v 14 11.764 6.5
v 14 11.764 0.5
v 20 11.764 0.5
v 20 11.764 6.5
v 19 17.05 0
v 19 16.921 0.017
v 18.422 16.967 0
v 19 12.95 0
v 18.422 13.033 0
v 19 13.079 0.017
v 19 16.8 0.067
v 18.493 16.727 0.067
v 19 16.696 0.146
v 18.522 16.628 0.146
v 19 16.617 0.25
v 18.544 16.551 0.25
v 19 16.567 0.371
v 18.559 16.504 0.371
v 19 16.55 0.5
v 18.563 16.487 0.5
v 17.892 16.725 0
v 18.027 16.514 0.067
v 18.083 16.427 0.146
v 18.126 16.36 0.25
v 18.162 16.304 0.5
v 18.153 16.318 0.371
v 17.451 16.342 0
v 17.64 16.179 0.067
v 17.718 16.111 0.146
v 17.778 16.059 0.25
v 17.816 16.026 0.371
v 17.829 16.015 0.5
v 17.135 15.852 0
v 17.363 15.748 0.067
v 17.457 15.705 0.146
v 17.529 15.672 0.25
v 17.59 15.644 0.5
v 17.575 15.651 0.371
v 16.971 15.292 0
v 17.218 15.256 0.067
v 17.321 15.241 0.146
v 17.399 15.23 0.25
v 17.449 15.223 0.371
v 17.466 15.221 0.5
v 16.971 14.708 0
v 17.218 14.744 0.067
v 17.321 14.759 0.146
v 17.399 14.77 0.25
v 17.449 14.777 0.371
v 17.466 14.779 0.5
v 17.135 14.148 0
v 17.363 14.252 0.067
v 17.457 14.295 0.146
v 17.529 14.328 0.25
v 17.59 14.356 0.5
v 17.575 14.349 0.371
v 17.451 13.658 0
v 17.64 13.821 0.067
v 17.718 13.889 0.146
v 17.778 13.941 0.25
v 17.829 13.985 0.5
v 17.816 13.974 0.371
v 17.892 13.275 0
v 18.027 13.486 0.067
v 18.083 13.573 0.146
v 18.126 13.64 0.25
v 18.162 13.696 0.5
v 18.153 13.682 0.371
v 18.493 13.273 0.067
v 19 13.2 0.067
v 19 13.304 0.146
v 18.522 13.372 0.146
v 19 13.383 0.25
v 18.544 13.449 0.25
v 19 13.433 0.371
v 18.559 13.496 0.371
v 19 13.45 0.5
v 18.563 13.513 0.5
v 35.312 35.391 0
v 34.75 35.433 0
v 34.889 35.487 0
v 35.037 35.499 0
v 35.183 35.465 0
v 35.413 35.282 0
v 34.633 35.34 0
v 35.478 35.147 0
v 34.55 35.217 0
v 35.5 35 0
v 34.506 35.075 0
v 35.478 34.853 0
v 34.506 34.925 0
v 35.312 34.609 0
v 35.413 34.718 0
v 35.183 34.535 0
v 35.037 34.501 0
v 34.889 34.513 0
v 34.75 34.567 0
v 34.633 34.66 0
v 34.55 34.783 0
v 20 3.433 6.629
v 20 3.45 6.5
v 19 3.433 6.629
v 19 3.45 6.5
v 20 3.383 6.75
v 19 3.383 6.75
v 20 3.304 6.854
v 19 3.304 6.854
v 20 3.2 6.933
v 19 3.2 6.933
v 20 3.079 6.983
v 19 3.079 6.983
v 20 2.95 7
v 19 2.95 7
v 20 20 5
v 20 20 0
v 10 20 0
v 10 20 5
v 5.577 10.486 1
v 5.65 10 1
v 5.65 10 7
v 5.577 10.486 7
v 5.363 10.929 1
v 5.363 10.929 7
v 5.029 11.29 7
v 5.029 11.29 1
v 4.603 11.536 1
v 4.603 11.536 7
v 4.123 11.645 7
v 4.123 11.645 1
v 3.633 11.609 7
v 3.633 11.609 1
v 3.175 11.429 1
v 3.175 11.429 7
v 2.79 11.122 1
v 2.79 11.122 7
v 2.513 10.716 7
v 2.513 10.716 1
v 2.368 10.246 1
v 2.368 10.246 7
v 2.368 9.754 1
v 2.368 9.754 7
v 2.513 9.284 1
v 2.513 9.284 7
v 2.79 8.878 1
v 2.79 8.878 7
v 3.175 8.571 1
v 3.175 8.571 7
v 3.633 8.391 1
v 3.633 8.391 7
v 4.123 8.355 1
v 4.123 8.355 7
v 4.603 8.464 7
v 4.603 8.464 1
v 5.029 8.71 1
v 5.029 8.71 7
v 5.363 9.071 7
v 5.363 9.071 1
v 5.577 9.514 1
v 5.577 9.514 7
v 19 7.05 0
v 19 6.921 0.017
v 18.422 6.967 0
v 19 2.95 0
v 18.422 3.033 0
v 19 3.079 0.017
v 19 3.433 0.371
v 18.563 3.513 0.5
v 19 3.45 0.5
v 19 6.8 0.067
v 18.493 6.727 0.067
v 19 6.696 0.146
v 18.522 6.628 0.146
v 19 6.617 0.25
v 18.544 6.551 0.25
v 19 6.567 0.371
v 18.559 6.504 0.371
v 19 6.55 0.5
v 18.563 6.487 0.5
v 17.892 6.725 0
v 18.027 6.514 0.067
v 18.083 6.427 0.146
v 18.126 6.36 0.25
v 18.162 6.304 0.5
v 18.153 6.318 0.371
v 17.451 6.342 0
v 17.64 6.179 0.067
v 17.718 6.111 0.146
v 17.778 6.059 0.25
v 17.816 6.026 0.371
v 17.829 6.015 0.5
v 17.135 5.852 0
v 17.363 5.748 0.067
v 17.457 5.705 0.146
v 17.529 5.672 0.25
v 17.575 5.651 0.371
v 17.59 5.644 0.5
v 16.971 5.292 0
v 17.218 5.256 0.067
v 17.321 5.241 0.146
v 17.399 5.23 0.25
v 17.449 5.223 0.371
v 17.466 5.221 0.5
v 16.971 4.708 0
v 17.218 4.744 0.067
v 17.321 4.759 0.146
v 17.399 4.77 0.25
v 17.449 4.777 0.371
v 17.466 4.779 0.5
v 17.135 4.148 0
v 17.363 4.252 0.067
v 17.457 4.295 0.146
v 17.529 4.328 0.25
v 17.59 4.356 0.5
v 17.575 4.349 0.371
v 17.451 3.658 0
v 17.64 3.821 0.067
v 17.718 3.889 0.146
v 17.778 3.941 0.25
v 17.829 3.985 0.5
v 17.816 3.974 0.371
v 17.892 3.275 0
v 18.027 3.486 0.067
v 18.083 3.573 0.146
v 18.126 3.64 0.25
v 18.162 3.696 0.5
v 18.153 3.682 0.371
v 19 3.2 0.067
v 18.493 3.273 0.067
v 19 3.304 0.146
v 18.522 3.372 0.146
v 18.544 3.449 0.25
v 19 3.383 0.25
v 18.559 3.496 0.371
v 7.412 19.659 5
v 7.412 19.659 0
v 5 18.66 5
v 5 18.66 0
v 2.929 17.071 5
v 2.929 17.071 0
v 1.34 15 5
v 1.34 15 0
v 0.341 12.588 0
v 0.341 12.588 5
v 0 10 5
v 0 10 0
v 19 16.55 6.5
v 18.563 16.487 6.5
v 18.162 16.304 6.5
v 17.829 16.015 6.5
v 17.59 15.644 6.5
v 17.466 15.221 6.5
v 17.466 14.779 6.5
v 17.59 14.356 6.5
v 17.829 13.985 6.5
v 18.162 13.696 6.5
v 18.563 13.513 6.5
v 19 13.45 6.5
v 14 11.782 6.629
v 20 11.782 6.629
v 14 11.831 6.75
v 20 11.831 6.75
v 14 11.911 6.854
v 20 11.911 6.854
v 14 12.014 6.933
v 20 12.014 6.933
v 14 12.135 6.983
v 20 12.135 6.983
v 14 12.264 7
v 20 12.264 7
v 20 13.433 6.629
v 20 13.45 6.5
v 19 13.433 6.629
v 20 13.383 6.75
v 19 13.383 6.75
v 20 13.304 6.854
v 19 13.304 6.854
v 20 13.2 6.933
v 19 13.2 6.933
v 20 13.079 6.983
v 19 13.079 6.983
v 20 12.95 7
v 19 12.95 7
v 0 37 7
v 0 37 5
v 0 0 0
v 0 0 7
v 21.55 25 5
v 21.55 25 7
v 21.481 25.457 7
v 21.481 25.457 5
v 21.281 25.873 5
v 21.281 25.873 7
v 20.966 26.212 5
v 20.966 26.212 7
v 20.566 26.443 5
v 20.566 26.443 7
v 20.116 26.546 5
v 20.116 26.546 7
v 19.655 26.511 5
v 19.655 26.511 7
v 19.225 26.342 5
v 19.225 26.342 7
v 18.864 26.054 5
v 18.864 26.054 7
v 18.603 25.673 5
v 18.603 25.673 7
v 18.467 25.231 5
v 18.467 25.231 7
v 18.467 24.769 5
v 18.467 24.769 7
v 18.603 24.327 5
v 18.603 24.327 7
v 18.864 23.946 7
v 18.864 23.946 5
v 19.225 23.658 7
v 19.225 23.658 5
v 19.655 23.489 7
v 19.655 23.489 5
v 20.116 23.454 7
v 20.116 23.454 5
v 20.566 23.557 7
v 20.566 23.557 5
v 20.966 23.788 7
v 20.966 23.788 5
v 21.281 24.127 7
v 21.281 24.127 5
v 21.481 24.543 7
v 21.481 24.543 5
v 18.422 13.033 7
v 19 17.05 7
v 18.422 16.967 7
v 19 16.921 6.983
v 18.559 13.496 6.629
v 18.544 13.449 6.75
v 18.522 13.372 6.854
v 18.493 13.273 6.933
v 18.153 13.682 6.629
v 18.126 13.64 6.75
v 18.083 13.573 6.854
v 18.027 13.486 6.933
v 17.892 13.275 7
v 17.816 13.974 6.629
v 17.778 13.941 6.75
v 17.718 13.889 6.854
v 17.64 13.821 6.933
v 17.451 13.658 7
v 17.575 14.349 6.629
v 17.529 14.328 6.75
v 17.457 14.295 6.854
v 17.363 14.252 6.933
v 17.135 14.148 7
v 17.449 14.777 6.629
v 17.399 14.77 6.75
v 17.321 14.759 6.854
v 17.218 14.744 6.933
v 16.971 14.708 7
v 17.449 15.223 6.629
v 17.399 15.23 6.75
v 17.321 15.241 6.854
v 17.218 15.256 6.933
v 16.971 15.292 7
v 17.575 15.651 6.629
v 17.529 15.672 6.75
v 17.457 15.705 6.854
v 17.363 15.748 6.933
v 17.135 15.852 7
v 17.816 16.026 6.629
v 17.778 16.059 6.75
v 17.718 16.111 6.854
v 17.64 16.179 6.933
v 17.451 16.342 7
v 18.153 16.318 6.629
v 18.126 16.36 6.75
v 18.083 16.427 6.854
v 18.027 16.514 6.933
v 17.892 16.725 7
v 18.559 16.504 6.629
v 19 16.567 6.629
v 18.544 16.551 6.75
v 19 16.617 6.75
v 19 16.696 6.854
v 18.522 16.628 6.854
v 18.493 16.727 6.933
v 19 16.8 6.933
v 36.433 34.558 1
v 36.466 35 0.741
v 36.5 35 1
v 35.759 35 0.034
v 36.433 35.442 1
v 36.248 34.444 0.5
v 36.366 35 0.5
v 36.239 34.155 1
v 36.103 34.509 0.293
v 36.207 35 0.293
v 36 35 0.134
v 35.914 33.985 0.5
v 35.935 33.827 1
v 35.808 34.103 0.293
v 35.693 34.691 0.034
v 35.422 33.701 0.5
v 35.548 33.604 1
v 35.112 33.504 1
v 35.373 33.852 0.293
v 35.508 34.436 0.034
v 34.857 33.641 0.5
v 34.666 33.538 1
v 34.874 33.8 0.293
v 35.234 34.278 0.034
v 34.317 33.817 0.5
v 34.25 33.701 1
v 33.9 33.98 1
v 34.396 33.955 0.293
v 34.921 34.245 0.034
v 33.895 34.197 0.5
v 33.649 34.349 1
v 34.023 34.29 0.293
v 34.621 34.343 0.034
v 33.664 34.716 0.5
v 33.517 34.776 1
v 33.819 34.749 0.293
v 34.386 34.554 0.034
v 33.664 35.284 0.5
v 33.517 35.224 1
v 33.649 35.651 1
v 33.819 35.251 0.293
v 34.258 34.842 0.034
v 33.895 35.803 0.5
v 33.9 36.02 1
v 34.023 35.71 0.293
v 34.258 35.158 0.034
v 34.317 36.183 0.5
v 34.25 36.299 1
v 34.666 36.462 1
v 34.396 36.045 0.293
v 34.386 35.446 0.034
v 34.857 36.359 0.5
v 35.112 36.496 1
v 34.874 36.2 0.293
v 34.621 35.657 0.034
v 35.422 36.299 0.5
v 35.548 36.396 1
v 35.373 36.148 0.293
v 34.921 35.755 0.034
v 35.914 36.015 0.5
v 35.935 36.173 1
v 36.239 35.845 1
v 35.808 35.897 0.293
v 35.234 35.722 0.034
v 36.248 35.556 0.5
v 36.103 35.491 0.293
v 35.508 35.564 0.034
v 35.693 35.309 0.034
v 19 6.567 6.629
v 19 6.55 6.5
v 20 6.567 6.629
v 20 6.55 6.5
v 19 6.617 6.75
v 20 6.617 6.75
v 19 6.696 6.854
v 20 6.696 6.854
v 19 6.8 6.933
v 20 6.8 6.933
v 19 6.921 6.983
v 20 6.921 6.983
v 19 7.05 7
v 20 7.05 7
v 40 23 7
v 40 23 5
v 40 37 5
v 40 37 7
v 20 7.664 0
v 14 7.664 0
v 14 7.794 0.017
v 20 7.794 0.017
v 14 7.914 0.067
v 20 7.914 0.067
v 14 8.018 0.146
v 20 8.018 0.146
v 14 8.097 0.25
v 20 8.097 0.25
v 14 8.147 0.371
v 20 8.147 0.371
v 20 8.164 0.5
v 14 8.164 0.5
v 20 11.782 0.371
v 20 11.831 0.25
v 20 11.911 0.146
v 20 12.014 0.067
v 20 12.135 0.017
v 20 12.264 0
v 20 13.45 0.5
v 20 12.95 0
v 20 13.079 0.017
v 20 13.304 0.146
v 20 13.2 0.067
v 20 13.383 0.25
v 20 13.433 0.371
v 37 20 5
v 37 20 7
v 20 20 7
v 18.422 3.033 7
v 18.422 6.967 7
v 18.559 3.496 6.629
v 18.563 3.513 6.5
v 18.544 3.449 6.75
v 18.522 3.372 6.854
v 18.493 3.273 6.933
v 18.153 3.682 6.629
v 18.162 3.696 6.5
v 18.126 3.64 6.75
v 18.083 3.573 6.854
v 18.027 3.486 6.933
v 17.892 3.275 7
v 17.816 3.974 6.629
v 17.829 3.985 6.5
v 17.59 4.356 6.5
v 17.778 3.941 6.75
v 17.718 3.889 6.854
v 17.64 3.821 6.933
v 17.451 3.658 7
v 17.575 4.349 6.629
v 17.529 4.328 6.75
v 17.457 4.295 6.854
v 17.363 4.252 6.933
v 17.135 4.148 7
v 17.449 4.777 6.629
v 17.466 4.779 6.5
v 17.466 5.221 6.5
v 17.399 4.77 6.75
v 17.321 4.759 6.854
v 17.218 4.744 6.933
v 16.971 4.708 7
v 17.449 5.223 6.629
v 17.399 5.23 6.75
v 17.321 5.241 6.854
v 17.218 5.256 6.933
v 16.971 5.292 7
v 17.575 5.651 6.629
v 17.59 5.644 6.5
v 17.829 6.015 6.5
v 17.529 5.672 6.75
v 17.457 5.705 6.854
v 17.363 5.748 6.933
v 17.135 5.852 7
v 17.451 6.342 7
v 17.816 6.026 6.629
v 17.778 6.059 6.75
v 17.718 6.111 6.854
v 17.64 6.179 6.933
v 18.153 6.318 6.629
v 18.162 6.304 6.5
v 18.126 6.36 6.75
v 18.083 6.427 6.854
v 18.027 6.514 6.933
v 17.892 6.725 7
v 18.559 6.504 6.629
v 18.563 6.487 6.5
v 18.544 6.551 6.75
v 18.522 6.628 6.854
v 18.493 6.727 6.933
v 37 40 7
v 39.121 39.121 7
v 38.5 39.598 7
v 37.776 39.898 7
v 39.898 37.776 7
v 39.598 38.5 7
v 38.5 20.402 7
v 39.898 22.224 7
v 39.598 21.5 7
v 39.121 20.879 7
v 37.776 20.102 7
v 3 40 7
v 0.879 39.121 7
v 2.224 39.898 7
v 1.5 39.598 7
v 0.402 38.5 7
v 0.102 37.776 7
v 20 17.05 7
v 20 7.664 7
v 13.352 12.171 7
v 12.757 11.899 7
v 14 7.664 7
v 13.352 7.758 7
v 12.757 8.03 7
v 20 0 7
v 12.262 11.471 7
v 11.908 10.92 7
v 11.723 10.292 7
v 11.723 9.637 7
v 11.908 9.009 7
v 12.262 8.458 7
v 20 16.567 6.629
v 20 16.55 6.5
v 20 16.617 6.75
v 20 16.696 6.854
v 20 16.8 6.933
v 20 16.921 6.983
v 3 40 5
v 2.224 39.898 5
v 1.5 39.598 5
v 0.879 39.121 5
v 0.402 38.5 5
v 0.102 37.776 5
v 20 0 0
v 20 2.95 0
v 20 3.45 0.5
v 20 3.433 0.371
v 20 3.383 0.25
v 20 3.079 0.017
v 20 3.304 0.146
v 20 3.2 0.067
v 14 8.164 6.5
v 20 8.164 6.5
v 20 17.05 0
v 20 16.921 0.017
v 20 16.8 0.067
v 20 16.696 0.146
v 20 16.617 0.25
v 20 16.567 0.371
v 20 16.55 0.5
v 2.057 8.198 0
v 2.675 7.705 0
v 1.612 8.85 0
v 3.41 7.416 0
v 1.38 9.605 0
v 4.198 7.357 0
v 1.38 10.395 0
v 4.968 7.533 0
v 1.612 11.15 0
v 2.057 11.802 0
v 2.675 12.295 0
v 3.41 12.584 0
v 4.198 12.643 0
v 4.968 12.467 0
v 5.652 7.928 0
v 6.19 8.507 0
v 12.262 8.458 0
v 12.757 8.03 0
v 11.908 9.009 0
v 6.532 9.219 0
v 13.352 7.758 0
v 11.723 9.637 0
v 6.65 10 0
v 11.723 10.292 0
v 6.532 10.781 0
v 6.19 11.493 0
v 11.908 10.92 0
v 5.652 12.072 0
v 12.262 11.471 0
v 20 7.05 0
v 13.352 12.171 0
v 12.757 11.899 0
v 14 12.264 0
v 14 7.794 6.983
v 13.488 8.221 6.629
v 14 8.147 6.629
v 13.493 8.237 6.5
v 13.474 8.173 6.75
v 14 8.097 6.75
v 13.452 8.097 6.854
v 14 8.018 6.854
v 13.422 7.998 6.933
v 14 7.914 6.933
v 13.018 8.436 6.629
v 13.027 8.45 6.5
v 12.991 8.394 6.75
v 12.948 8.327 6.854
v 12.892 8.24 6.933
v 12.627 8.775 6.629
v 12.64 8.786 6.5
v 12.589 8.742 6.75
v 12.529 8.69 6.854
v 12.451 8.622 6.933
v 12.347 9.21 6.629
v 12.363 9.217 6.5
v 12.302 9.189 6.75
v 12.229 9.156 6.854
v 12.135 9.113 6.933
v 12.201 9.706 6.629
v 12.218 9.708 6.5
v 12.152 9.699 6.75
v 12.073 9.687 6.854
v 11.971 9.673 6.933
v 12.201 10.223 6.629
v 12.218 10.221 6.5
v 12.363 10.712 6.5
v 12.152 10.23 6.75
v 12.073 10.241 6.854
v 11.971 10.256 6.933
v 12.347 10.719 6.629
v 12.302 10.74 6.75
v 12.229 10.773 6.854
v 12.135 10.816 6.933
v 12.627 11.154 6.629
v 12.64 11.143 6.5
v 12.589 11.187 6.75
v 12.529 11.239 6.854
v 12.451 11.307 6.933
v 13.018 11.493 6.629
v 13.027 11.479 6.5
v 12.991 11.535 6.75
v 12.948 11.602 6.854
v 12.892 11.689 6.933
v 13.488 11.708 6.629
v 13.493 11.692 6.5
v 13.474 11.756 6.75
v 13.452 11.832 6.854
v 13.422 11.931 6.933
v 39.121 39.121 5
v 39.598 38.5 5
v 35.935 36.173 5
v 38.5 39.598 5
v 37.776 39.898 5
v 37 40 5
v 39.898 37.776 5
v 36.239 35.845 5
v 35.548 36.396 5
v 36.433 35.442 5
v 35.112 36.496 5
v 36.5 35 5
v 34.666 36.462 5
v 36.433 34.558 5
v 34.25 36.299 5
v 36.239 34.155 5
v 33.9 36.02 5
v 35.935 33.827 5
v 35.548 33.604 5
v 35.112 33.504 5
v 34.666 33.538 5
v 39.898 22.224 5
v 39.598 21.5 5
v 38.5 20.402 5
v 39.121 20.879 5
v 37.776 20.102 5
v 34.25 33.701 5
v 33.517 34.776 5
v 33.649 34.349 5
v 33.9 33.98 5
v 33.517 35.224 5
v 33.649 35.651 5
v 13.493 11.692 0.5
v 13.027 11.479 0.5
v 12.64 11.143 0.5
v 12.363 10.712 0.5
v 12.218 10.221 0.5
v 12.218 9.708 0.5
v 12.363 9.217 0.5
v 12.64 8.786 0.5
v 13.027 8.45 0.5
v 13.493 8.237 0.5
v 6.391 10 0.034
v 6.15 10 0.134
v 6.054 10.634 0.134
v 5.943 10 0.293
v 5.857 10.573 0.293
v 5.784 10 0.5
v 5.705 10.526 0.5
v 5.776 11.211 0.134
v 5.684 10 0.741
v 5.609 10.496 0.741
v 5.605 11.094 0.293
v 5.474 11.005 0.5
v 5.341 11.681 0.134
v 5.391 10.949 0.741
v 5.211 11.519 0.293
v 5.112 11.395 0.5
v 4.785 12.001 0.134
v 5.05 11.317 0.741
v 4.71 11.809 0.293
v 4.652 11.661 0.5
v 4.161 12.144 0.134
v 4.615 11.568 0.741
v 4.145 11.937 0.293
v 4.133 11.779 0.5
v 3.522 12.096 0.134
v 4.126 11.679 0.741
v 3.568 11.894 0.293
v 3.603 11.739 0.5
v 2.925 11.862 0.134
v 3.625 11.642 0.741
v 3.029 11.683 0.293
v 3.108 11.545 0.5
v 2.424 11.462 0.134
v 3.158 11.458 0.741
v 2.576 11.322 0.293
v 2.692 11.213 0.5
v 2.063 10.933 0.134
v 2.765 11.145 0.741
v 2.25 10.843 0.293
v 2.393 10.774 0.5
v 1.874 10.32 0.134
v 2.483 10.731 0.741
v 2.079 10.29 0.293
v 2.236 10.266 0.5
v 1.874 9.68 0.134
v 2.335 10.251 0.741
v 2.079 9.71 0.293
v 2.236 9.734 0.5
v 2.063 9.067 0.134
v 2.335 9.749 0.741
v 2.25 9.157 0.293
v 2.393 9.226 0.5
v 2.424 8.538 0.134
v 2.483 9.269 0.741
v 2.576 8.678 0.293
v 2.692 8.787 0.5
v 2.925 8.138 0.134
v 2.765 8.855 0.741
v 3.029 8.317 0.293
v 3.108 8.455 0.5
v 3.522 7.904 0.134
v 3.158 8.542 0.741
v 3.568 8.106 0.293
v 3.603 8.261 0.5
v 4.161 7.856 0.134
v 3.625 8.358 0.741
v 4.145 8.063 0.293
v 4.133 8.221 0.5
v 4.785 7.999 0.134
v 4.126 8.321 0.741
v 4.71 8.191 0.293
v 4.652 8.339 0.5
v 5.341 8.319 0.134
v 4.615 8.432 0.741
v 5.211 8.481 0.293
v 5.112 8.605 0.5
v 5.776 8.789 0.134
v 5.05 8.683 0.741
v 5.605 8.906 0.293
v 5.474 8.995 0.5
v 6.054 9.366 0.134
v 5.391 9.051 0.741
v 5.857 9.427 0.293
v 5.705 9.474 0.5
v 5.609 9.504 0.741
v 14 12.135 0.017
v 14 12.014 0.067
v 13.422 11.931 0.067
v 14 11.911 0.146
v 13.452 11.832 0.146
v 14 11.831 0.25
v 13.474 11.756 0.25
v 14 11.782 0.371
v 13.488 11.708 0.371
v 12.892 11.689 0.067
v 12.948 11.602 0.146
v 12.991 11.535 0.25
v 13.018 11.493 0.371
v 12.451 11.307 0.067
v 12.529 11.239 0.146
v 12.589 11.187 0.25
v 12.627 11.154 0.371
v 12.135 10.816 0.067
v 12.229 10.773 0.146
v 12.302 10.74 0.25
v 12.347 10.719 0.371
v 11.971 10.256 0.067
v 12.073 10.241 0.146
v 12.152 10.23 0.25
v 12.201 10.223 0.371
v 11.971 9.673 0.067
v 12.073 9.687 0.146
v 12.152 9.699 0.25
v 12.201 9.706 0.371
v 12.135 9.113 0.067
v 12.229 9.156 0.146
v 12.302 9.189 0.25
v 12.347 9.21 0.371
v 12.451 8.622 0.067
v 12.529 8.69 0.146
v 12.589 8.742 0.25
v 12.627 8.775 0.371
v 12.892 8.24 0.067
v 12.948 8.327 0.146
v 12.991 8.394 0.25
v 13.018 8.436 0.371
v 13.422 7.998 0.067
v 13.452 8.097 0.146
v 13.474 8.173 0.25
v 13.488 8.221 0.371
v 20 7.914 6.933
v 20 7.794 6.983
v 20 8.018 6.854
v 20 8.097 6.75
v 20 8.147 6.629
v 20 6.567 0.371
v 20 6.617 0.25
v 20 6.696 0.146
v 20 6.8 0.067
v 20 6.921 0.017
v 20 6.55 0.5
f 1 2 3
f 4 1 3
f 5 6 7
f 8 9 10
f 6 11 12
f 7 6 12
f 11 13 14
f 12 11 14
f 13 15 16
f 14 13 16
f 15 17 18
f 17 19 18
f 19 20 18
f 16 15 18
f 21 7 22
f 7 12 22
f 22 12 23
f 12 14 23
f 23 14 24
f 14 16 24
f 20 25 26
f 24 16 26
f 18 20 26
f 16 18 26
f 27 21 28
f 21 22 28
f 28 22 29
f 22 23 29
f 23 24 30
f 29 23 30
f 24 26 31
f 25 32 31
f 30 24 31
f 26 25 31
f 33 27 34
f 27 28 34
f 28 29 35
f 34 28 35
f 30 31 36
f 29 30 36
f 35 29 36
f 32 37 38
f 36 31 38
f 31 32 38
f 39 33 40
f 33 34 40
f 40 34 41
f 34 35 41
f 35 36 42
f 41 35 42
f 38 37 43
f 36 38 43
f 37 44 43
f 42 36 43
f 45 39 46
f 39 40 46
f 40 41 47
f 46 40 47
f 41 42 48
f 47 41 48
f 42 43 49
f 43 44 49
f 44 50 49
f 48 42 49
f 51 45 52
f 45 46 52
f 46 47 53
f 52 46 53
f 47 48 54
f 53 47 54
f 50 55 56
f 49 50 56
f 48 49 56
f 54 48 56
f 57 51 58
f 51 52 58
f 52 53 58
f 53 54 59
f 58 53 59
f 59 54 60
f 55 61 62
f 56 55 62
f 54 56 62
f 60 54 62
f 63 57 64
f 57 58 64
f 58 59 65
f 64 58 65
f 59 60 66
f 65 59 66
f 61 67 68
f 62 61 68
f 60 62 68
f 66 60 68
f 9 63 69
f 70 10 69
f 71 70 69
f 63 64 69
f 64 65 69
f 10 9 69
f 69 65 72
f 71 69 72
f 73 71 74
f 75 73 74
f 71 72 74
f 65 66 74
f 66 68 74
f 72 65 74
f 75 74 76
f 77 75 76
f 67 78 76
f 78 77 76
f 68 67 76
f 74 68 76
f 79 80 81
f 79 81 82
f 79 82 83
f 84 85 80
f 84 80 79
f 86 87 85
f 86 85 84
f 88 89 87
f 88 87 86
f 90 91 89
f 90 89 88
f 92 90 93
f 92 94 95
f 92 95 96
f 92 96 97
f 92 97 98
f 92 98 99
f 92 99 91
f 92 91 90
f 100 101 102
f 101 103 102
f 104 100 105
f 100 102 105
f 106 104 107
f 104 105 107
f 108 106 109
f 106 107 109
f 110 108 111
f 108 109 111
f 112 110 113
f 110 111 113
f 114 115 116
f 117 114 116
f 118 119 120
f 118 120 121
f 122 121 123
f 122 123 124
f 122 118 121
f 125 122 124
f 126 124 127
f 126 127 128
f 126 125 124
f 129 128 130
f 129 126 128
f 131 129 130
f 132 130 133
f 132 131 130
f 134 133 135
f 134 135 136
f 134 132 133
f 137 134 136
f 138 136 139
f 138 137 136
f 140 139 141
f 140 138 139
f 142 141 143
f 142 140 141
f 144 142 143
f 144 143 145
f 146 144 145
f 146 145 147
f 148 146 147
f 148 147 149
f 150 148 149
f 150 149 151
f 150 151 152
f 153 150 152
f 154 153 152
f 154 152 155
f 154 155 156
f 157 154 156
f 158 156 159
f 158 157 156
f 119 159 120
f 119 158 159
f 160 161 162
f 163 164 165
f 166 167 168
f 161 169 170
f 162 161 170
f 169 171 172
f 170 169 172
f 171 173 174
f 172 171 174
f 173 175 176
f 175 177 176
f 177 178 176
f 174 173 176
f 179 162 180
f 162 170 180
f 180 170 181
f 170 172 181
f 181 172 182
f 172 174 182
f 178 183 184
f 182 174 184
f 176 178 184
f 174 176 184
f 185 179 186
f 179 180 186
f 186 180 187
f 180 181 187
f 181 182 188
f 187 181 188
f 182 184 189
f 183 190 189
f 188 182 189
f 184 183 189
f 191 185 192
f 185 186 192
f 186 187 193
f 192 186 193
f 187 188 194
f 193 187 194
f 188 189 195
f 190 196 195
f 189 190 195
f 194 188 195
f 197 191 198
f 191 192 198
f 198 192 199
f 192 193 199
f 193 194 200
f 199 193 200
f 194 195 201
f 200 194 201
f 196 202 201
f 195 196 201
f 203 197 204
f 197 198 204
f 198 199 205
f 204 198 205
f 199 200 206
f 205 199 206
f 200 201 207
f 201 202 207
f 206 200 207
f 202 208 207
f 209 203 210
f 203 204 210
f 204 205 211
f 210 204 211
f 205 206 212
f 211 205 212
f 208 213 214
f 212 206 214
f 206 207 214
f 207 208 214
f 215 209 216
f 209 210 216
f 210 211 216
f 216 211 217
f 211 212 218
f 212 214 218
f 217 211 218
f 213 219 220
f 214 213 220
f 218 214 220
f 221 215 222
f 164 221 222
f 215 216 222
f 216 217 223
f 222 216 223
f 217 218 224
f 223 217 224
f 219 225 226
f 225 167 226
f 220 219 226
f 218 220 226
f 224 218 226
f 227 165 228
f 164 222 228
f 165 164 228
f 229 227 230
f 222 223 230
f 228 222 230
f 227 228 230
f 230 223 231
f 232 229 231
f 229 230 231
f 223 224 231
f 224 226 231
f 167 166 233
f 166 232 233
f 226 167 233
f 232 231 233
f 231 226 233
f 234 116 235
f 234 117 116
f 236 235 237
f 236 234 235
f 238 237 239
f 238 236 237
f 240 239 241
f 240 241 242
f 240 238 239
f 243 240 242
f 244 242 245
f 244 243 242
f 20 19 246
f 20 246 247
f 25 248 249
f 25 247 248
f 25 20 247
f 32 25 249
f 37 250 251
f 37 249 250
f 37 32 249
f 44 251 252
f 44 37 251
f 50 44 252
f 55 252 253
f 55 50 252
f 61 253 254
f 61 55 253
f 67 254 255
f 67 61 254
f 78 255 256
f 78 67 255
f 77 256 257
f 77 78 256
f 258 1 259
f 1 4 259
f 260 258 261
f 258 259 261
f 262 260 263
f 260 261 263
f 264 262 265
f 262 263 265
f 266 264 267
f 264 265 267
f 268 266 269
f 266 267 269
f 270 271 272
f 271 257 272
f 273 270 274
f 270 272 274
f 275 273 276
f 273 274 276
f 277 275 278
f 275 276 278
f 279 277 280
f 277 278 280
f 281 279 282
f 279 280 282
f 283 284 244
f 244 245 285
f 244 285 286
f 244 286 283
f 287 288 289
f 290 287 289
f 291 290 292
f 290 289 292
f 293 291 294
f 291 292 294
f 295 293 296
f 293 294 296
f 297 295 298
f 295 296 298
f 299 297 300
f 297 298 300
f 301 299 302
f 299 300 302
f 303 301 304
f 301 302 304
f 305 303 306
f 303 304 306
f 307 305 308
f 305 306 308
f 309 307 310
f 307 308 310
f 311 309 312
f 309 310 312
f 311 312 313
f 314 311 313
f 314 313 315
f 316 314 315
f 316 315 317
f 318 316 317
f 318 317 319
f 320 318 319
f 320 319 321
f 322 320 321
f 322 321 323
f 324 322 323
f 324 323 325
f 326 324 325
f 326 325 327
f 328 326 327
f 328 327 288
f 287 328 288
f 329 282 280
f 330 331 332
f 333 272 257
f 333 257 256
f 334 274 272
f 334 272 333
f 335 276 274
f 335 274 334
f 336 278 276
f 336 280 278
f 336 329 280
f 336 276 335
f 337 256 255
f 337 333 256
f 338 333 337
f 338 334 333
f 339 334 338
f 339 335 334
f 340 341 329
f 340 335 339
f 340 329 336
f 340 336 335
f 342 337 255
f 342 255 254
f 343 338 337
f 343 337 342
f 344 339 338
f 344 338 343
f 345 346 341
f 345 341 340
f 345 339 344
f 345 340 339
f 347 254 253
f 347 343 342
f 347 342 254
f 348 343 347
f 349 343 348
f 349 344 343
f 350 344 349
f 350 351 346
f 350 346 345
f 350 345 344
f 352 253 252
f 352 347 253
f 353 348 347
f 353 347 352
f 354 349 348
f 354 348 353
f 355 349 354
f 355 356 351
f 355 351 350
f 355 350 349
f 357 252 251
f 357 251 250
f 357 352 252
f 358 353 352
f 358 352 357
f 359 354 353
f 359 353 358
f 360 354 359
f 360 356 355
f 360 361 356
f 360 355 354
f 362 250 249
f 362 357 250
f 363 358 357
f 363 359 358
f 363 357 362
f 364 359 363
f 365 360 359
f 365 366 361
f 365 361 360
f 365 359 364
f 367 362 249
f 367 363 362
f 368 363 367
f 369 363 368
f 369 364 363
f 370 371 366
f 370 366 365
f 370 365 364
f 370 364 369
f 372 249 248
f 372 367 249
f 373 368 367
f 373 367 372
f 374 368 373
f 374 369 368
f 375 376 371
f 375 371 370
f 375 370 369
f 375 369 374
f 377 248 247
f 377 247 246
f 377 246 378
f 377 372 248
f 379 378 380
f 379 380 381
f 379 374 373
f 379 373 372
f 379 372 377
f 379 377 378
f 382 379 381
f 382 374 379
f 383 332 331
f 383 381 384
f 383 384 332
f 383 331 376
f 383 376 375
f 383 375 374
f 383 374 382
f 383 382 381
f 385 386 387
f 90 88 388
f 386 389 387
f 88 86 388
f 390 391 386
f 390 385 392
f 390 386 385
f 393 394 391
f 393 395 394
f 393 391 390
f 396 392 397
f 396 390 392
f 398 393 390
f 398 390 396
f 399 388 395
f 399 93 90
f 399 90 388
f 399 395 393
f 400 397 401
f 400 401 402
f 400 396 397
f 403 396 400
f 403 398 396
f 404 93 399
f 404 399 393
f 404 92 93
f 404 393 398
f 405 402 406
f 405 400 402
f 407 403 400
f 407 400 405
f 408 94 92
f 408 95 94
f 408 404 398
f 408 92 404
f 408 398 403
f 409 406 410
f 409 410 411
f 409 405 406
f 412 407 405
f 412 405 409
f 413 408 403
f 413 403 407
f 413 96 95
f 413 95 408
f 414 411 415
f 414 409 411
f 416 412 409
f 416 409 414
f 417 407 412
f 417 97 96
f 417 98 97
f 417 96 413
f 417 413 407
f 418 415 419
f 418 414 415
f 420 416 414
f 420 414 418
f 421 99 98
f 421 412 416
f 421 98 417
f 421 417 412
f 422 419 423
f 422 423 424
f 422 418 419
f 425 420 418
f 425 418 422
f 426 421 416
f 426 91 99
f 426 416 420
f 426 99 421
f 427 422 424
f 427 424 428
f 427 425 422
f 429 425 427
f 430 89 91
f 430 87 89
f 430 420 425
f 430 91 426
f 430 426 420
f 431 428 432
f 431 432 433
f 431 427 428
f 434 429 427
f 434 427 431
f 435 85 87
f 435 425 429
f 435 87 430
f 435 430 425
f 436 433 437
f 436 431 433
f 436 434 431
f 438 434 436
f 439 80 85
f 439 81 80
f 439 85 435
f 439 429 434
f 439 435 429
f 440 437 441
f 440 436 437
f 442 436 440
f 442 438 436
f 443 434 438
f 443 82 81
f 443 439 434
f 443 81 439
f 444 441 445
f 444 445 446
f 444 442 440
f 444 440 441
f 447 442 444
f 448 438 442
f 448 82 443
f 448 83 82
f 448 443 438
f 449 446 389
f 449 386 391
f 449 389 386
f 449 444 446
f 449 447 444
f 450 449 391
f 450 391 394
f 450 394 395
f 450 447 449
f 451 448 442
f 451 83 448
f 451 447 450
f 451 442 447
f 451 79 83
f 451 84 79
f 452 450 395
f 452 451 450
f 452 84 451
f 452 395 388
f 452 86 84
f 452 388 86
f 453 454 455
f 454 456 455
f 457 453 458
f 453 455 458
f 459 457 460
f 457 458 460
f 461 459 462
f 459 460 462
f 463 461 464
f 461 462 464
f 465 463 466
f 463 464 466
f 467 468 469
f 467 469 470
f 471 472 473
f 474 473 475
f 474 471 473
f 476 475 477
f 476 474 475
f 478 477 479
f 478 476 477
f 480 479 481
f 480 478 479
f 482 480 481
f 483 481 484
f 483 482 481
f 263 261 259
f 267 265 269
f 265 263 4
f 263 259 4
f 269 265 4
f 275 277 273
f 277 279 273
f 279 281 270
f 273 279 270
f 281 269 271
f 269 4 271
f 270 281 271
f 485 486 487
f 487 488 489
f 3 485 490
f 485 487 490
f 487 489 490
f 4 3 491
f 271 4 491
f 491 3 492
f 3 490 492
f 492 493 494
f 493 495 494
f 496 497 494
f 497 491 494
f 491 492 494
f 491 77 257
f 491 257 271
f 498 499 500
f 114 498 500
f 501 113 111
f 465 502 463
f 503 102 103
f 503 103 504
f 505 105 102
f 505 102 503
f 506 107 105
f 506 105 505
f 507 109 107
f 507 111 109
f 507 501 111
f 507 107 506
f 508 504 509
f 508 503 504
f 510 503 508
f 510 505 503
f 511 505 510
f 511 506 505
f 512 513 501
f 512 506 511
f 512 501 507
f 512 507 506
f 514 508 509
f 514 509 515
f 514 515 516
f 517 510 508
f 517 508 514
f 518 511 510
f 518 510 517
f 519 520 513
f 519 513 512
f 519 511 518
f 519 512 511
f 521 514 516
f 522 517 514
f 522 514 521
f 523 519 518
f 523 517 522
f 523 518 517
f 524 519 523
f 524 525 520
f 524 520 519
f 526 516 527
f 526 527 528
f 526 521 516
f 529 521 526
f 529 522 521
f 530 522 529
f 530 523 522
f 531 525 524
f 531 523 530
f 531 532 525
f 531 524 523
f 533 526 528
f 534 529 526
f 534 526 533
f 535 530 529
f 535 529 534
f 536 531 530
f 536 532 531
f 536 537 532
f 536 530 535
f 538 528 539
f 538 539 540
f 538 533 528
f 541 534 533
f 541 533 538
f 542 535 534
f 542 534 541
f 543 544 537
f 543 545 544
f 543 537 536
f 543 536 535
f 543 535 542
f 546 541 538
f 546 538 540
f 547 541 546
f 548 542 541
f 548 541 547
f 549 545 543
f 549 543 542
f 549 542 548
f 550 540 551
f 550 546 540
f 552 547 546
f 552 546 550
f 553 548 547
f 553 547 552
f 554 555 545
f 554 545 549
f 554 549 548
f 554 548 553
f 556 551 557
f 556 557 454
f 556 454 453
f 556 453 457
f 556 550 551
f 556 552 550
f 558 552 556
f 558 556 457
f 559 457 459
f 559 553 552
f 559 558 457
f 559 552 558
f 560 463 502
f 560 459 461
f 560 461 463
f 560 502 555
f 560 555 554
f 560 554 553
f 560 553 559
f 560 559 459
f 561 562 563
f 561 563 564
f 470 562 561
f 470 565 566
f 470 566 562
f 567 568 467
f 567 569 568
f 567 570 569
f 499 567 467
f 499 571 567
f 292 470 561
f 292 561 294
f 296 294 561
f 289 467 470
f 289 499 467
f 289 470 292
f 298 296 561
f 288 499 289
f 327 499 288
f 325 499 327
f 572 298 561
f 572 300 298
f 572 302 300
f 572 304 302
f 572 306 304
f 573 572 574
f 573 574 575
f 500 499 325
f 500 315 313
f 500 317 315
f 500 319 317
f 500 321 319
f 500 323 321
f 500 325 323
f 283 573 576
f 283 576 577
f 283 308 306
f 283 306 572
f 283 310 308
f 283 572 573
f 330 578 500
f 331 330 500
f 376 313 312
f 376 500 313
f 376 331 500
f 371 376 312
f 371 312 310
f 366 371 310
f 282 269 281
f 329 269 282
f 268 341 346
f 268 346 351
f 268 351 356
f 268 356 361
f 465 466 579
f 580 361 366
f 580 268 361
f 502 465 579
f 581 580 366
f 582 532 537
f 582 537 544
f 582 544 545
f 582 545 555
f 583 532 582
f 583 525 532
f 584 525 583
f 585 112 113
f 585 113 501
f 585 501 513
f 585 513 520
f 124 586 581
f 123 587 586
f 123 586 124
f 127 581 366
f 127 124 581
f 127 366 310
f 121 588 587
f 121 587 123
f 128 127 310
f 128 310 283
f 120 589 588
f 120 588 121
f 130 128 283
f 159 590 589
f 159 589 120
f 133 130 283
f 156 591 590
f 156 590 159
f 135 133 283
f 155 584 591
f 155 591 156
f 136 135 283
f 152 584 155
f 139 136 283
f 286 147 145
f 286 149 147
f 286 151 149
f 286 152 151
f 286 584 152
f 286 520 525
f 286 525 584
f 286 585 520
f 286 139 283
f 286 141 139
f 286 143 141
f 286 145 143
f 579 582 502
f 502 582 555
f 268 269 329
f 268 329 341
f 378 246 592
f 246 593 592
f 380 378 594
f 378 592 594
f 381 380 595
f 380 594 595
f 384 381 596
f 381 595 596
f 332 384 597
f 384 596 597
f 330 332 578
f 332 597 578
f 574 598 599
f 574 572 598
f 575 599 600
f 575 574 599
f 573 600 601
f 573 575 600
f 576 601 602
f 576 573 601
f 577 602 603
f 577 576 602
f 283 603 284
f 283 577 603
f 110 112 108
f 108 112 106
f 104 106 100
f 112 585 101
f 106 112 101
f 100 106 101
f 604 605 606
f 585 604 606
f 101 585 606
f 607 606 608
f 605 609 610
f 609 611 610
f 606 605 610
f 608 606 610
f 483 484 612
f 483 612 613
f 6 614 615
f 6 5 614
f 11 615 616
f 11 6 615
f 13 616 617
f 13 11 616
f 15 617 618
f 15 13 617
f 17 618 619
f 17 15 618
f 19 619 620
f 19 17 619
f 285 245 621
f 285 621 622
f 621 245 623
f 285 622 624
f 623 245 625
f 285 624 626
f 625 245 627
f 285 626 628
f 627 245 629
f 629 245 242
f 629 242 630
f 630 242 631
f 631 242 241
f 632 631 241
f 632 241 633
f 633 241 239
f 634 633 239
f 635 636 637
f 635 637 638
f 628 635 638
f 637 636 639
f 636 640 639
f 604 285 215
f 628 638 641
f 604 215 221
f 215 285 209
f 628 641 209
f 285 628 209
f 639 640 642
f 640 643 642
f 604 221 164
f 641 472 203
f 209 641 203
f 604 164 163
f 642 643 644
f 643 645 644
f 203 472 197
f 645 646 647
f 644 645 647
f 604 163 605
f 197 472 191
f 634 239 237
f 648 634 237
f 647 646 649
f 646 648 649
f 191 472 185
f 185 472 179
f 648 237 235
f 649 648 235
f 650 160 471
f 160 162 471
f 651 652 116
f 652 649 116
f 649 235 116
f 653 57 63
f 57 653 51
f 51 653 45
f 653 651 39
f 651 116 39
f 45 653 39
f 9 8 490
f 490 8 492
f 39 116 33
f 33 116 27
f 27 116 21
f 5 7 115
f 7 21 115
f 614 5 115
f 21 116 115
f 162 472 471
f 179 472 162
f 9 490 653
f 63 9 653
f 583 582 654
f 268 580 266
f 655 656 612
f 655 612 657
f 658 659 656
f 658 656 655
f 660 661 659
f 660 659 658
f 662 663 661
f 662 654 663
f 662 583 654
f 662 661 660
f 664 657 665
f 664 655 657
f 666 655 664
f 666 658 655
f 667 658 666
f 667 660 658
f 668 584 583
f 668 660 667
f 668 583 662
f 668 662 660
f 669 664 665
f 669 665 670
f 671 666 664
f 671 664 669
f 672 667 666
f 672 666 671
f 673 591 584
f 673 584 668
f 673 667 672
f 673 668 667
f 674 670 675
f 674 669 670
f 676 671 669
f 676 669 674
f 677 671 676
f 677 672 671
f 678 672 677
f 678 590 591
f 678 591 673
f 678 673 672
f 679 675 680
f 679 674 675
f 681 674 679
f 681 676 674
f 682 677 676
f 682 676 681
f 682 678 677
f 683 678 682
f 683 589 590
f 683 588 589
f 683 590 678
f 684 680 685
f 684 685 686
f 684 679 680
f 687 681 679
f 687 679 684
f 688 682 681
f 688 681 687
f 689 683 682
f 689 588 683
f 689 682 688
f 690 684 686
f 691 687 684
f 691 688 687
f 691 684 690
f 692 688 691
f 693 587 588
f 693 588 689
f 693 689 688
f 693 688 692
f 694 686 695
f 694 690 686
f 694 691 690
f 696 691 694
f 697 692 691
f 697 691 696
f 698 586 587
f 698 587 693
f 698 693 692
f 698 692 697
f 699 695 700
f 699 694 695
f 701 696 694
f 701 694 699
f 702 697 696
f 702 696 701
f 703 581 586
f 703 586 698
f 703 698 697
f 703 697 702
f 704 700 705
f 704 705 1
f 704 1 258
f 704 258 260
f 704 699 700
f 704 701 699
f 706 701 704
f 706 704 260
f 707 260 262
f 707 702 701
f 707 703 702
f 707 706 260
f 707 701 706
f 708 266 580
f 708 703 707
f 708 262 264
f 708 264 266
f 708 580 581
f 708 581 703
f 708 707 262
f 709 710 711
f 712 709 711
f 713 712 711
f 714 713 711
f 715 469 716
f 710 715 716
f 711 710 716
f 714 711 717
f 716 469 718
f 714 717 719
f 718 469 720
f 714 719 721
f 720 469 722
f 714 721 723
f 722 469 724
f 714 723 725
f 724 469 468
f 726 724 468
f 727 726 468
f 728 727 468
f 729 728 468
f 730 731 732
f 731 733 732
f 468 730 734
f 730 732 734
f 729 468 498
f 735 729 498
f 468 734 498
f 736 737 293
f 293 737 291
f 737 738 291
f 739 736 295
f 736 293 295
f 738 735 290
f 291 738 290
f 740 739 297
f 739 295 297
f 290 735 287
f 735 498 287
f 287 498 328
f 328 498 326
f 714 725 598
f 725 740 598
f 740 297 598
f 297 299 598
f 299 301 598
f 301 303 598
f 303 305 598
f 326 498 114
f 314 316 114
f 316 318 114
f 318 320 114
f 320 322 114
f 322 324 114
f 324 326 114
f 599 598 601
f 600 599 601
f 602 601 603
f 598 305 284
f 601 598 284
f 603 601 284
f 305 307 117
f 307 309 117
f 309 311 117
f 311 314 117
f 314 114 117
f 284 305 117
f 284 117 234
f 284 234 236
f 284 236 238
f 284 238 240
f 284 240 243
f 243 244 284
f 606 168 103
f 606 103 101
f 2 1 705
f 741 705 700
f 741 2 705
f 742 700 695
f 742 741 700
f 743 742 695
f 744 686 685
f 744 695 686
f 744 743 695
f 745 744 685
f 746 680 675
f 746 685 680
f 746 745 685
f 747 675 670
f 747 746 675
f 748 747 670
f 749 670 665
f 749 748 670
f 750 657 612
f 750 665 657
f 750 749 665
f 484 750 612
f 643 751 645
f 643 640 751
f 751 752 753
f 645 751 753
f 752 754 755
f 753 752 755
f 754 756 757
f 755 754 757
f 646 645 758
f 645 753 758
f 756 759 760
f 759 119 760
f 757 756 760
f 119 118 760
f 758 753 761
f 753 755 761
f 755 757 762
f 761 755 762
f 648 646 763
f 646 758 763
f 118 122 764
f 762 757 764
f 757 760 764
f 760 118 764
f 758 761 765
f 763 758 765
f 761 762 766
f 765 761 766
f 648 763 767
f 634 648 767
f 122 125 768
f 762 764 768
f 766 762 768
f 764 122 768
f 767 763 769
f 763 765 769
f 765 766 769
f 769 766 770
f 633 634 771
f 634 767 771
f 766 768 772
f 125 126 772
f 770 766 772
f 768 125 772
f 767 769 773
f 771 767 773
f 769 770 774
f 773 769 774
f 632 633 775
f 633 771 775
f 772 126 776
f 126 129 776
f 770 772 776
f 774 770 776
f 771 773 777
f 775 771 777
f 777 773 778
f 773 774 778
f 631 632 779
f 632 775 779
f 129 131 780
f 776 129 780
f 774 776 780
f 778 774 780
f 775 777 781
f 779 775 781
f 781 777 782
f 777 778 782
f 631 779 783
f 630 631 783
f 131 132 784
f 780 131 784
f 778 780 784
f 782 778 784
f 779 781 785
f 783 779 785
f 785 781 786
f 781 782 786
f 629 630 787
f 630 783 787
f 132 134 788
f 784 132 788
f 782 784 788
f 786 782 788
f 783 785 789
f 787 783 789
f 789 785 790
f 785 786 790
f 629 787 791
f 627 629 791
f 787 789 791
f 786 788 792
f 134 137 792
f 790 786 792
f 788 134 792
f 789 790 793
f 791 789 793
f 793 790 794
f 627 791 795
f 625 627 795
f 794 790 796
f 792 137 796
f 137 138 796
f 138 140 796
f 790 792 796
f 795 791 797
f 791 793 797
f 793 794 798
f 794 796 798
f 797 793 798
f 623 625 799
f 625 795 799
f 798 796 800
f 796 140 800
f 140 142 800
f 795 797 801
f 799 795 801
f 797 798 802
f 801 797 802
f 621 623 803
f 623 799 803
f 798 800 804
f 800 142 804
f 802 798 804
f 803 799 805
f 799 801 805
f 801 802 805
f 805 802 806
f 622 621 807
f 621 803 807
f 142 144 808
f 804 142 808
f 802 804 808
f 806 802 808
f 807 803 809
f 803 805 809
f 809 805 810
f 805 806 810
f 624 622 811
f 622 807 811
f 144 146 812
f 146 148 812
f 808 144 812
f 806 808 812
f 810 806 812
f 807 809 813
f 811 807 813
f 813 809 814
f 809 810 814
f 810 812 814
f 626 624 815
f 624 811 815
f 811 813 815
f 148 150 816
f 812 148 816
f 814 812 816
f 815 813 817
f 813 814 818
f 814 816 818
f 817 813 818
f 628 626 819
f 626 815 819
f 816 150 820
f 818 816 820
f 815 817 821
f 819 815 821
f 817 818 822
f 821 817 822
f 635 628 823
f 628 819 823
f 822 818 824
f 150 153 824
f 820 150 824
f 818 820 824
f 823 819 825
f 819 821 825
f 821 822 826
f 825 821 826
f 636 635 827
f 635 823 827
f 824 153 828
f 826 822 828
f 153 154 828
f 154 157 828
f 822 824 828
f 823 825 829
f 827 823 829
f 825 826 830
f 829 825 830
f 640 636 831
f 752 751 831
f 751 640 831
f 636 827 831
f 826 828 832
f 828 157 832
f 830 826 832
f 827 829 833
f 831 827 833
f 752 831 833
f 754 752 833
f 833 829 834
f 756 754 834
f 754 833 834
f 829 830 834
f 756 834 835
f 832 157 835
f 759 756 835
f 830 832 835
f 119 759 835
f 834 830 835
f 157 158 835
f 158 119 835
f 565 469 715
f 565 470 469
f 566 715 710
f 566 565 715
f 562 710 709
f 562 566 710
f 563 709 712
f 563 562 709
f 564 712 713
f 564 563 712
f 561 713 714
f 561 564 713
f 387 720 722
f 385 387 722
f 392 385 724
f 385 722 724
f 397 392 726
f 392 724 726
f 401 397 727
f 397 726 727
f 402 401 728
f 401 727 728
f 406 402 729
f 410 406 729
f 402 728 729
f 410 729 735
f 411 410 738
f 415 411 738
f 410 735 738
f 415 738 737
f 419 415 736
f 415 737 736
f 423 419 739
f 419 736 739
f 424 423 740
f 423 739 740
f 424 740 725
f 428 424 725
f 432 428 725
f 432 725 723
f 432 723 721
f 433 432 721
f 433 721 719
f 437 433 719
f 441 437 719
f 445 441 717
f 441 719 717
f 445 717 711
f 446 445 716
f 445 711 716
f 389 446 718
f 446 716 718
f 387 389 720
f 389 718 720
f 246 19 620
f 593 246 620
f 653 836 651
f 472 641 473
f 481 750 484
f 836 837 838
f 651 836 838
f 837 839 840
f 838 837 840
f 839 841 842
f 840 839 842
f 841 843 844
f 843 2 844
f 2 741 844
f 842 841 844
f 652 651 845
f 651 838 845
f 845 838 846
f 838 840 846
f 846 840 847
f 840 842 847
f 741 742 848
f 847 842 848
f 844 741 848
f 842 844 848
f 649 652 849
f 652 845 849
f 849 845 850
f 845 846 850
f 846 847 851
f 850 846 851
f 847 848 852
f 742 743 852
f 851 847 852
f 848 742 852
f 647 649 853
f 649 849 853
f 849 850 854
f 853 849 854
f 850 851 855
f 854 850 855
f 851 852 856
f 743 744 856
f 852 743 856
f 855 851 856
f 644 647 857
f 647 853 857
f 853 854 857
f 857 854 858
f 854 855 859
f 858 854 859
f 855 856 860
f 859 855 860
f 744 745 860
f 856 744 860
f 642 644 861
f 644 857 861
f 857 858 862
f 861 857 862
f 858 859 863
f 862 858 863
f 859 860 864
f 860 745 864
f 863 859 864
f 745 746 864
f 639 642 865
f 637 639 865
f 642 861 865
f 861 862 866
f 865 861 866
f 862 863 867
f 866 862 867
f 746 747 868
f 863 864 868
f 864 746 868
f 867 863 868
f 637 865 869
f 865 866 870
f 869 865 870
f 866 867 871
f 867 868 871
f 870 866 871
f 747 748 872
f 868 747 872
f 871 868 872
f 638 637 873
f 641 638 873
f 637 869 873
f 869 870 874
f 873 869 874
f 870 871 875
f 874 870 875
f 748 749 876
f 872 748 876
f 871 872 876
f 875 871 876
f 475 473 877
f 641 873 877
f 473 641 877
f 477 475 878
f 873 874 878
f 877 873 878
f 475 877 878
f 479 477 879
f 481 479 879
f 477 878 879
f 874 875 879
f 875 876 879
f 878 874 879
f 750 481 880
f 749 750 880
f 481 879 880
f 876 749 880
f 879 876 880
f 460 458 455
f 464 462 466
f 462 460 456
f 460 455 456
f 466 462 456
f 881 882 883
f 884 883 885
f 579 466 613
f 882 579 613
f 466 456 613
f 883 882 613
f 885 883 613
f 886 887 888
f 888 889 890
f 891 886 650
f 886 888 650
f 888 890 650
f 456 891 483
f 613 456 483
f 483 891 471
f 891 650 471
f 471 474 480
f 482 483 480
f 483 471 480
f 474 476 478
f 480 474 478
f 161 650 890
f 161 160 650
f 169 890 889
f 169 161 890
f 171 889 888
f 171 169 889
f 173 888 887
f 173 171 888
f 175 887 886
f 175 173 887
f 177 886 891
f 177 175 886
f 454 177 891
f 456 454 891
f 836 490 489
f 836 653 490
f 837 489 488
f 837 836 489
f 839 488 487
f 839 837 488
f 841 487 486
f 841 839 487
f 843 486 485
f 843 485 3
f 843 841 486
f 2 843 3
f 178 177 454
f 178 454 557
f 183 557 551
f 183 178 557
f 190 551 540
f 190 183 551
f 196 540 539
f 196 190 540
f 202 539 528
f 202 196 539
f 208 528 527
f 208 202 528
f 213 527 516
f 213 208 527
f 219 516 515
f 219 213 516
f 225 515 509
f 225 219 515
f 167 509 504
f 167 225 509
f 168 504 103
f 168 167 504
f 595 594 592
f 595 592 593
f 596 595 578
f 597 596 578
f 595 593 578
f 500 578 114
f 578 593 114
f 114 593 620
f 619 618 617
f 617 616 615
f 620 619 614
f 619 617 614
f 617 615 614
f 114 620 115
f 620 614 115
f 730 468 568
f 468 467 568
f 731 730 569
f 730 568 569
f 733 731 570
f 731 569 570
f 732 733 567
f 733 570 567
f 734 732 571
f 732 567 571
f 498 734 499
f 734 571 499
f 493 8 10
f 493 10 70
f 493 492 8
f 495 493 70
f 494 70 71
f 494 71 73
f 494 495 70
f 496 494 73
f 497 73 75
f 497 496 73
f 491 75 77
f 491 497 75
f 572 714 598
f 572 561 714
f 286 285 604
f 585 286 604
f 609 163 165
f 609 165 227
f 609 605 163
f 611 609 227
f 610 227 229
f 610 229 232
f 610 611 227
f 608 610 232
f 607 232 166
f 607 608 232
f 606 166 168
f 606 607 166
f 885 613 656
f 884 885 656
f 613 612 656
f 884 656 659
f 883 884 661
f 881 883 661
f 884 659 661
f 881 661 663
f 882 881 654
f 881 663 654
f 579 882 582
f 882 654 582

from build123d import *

# Parameters (mm, degrees)
SKETCH_R     = 1.65
PAD_DEPTH    = 7
SKETCH001_W  = 40
SKETCH001_H  = 2
PAD001_DEPTH = 20
FILLET_R     = 3
FILLET001_R  = 10
SKETCH002_R  = 1.55
POCKET_DEPTH = 5
SKETCH003_R  = 1.5
PAD002_DEPTH = 5
FILLET002_R  = 1
FILLET003_R  = 1
FILLET004_R  = 0.5


with BuildPart() as part:
    # Sketch → Pad (new body)
    with BuildSketch(Plane.XY):
        with BuildLine():
            Line((0, 0), (20, 0))
            Line((20, 0), (20, 3.45))
            Line((18.999985, 3.45), (20, 3.45))
            ThreePointArc((18.999985, 6.55), (17.45, 5), (18.999985, 3.45))
            Line((18.999985, 6.55), (20, 6.55))
            Line((20, 6.55), (20, 8.164485))
            Line((14, 8.164485), (20, 8.164485))
            ThreePointArc((14, 11.764485), (12.2, 9.964485), (14, 8.164485))
            Line((14, 11.764485), (20, 11.764485))
            Line((20, 11.764485), (20, 13.45))
            Line((19, 13.45), (20, 13.45))
            ThreePointArc((19, 16.55), (17.45, 15), (19, 13.45))
            Line((19, 16.55), (20, 16.55))
            Line((20, 16.55), (20, 20))
            Line((20, 20), (0, 20))
            Line((0, 20), (0, 0))
        make_face()
        with Locations((4, 10)):
            Circle(SKETCH_R, mode=Mode.SUBTRACT)
    extrude(amount=PAD_DEPTH)

    # Sketch001 → Pad001 (new body)
    with BuildSketch(Plane(origin=(0, 20, 0), x_dir=(-1, 0, 0), z_dir=(0, 1, 0))):
        with Locations((-20, 6)):
            Rectangle(SKETCH001_W, SKETCH001_H)
    extrude(amount=PAD001_DEPTH)

    # Fillet
    fillet_edges = [part.edges().sort_by_distance(p)[0] for p in [
        (40, 20, 6),
        (40, 40, 6),
        (0, 40, 6),
    ]]
    fillet(fillet_edges, radius=FILLET_R)

    # Fillet001
    fillet001_edges = [part.edges().sort_by_distance(p)[0] for p in [
        (0, 20, 2.5),
    ]]
    fillet(fillet001_edges, radius=FILLET001_R)

    # Sketch002 → Pocket (cut)
    with BuildSketch(Plane.XY.offset(7)):
        with Locations((20, 25)):
            Circle(SKETCH002_R)
    extrude(amount=-POCKET_DEPTH, mode=Mode.SUBTRACT)

    # Sketch003 → Pad002 (new body)
    with BuildSketch(Plane(origin=(0, 0, 5), x_dir=(1, 0, 0), z_dir=(0, 0, -1))):
        with Locations((35, -35)):
            Circle(SKETCH003_R)
    extrude(amount=PAD002_DEPTH)

    # Fillet002
    fillet002_edges = [part.edges().sort_by_distance(p)[0] for p in [
        (33.5, 35, 0),
    ]]
    fillet(fillet002_edges, radius=FILLET002_R)

    # Fillet003
    fillet003_edges = [part.edges().sort_by_distance(p)[0] for p in [
        (2.35, 10, 0),
    ]]
    fillet(fillet003_edges, radius=FILLET003_R)

    # Fillet004
    fillet004_edges = [part.edges().sort_by_distance(p)[0] for p in [
        (17.45, 5, 0),
        (19.499993, 3.45, 0),
        (19.499993, 6.55, 0),
        (17, 8.164485, 0),
        (12.2, 9.964485, 0),
        (17, 11.764485, 0),
        (19.5, 13.45, 0),
        (17.45, 15, 0),
        (19.5, 16.55, 0),
        (19.5, 16.55, 7),
        (17.45, 15, 7),
        (19.5, 13.45, 7),
        (17, 11.764485, 7),
        (12.2, 9.964485, 7),
        (17, 8.164485, 7),
        (19.499993, 6.55, 7),
        (17.45, 5, 7),
        (19.499993, 3.45, 7),
    ]]
    fillet(fillet004_edges, radius=FILLET004_R)


solid = part.part
